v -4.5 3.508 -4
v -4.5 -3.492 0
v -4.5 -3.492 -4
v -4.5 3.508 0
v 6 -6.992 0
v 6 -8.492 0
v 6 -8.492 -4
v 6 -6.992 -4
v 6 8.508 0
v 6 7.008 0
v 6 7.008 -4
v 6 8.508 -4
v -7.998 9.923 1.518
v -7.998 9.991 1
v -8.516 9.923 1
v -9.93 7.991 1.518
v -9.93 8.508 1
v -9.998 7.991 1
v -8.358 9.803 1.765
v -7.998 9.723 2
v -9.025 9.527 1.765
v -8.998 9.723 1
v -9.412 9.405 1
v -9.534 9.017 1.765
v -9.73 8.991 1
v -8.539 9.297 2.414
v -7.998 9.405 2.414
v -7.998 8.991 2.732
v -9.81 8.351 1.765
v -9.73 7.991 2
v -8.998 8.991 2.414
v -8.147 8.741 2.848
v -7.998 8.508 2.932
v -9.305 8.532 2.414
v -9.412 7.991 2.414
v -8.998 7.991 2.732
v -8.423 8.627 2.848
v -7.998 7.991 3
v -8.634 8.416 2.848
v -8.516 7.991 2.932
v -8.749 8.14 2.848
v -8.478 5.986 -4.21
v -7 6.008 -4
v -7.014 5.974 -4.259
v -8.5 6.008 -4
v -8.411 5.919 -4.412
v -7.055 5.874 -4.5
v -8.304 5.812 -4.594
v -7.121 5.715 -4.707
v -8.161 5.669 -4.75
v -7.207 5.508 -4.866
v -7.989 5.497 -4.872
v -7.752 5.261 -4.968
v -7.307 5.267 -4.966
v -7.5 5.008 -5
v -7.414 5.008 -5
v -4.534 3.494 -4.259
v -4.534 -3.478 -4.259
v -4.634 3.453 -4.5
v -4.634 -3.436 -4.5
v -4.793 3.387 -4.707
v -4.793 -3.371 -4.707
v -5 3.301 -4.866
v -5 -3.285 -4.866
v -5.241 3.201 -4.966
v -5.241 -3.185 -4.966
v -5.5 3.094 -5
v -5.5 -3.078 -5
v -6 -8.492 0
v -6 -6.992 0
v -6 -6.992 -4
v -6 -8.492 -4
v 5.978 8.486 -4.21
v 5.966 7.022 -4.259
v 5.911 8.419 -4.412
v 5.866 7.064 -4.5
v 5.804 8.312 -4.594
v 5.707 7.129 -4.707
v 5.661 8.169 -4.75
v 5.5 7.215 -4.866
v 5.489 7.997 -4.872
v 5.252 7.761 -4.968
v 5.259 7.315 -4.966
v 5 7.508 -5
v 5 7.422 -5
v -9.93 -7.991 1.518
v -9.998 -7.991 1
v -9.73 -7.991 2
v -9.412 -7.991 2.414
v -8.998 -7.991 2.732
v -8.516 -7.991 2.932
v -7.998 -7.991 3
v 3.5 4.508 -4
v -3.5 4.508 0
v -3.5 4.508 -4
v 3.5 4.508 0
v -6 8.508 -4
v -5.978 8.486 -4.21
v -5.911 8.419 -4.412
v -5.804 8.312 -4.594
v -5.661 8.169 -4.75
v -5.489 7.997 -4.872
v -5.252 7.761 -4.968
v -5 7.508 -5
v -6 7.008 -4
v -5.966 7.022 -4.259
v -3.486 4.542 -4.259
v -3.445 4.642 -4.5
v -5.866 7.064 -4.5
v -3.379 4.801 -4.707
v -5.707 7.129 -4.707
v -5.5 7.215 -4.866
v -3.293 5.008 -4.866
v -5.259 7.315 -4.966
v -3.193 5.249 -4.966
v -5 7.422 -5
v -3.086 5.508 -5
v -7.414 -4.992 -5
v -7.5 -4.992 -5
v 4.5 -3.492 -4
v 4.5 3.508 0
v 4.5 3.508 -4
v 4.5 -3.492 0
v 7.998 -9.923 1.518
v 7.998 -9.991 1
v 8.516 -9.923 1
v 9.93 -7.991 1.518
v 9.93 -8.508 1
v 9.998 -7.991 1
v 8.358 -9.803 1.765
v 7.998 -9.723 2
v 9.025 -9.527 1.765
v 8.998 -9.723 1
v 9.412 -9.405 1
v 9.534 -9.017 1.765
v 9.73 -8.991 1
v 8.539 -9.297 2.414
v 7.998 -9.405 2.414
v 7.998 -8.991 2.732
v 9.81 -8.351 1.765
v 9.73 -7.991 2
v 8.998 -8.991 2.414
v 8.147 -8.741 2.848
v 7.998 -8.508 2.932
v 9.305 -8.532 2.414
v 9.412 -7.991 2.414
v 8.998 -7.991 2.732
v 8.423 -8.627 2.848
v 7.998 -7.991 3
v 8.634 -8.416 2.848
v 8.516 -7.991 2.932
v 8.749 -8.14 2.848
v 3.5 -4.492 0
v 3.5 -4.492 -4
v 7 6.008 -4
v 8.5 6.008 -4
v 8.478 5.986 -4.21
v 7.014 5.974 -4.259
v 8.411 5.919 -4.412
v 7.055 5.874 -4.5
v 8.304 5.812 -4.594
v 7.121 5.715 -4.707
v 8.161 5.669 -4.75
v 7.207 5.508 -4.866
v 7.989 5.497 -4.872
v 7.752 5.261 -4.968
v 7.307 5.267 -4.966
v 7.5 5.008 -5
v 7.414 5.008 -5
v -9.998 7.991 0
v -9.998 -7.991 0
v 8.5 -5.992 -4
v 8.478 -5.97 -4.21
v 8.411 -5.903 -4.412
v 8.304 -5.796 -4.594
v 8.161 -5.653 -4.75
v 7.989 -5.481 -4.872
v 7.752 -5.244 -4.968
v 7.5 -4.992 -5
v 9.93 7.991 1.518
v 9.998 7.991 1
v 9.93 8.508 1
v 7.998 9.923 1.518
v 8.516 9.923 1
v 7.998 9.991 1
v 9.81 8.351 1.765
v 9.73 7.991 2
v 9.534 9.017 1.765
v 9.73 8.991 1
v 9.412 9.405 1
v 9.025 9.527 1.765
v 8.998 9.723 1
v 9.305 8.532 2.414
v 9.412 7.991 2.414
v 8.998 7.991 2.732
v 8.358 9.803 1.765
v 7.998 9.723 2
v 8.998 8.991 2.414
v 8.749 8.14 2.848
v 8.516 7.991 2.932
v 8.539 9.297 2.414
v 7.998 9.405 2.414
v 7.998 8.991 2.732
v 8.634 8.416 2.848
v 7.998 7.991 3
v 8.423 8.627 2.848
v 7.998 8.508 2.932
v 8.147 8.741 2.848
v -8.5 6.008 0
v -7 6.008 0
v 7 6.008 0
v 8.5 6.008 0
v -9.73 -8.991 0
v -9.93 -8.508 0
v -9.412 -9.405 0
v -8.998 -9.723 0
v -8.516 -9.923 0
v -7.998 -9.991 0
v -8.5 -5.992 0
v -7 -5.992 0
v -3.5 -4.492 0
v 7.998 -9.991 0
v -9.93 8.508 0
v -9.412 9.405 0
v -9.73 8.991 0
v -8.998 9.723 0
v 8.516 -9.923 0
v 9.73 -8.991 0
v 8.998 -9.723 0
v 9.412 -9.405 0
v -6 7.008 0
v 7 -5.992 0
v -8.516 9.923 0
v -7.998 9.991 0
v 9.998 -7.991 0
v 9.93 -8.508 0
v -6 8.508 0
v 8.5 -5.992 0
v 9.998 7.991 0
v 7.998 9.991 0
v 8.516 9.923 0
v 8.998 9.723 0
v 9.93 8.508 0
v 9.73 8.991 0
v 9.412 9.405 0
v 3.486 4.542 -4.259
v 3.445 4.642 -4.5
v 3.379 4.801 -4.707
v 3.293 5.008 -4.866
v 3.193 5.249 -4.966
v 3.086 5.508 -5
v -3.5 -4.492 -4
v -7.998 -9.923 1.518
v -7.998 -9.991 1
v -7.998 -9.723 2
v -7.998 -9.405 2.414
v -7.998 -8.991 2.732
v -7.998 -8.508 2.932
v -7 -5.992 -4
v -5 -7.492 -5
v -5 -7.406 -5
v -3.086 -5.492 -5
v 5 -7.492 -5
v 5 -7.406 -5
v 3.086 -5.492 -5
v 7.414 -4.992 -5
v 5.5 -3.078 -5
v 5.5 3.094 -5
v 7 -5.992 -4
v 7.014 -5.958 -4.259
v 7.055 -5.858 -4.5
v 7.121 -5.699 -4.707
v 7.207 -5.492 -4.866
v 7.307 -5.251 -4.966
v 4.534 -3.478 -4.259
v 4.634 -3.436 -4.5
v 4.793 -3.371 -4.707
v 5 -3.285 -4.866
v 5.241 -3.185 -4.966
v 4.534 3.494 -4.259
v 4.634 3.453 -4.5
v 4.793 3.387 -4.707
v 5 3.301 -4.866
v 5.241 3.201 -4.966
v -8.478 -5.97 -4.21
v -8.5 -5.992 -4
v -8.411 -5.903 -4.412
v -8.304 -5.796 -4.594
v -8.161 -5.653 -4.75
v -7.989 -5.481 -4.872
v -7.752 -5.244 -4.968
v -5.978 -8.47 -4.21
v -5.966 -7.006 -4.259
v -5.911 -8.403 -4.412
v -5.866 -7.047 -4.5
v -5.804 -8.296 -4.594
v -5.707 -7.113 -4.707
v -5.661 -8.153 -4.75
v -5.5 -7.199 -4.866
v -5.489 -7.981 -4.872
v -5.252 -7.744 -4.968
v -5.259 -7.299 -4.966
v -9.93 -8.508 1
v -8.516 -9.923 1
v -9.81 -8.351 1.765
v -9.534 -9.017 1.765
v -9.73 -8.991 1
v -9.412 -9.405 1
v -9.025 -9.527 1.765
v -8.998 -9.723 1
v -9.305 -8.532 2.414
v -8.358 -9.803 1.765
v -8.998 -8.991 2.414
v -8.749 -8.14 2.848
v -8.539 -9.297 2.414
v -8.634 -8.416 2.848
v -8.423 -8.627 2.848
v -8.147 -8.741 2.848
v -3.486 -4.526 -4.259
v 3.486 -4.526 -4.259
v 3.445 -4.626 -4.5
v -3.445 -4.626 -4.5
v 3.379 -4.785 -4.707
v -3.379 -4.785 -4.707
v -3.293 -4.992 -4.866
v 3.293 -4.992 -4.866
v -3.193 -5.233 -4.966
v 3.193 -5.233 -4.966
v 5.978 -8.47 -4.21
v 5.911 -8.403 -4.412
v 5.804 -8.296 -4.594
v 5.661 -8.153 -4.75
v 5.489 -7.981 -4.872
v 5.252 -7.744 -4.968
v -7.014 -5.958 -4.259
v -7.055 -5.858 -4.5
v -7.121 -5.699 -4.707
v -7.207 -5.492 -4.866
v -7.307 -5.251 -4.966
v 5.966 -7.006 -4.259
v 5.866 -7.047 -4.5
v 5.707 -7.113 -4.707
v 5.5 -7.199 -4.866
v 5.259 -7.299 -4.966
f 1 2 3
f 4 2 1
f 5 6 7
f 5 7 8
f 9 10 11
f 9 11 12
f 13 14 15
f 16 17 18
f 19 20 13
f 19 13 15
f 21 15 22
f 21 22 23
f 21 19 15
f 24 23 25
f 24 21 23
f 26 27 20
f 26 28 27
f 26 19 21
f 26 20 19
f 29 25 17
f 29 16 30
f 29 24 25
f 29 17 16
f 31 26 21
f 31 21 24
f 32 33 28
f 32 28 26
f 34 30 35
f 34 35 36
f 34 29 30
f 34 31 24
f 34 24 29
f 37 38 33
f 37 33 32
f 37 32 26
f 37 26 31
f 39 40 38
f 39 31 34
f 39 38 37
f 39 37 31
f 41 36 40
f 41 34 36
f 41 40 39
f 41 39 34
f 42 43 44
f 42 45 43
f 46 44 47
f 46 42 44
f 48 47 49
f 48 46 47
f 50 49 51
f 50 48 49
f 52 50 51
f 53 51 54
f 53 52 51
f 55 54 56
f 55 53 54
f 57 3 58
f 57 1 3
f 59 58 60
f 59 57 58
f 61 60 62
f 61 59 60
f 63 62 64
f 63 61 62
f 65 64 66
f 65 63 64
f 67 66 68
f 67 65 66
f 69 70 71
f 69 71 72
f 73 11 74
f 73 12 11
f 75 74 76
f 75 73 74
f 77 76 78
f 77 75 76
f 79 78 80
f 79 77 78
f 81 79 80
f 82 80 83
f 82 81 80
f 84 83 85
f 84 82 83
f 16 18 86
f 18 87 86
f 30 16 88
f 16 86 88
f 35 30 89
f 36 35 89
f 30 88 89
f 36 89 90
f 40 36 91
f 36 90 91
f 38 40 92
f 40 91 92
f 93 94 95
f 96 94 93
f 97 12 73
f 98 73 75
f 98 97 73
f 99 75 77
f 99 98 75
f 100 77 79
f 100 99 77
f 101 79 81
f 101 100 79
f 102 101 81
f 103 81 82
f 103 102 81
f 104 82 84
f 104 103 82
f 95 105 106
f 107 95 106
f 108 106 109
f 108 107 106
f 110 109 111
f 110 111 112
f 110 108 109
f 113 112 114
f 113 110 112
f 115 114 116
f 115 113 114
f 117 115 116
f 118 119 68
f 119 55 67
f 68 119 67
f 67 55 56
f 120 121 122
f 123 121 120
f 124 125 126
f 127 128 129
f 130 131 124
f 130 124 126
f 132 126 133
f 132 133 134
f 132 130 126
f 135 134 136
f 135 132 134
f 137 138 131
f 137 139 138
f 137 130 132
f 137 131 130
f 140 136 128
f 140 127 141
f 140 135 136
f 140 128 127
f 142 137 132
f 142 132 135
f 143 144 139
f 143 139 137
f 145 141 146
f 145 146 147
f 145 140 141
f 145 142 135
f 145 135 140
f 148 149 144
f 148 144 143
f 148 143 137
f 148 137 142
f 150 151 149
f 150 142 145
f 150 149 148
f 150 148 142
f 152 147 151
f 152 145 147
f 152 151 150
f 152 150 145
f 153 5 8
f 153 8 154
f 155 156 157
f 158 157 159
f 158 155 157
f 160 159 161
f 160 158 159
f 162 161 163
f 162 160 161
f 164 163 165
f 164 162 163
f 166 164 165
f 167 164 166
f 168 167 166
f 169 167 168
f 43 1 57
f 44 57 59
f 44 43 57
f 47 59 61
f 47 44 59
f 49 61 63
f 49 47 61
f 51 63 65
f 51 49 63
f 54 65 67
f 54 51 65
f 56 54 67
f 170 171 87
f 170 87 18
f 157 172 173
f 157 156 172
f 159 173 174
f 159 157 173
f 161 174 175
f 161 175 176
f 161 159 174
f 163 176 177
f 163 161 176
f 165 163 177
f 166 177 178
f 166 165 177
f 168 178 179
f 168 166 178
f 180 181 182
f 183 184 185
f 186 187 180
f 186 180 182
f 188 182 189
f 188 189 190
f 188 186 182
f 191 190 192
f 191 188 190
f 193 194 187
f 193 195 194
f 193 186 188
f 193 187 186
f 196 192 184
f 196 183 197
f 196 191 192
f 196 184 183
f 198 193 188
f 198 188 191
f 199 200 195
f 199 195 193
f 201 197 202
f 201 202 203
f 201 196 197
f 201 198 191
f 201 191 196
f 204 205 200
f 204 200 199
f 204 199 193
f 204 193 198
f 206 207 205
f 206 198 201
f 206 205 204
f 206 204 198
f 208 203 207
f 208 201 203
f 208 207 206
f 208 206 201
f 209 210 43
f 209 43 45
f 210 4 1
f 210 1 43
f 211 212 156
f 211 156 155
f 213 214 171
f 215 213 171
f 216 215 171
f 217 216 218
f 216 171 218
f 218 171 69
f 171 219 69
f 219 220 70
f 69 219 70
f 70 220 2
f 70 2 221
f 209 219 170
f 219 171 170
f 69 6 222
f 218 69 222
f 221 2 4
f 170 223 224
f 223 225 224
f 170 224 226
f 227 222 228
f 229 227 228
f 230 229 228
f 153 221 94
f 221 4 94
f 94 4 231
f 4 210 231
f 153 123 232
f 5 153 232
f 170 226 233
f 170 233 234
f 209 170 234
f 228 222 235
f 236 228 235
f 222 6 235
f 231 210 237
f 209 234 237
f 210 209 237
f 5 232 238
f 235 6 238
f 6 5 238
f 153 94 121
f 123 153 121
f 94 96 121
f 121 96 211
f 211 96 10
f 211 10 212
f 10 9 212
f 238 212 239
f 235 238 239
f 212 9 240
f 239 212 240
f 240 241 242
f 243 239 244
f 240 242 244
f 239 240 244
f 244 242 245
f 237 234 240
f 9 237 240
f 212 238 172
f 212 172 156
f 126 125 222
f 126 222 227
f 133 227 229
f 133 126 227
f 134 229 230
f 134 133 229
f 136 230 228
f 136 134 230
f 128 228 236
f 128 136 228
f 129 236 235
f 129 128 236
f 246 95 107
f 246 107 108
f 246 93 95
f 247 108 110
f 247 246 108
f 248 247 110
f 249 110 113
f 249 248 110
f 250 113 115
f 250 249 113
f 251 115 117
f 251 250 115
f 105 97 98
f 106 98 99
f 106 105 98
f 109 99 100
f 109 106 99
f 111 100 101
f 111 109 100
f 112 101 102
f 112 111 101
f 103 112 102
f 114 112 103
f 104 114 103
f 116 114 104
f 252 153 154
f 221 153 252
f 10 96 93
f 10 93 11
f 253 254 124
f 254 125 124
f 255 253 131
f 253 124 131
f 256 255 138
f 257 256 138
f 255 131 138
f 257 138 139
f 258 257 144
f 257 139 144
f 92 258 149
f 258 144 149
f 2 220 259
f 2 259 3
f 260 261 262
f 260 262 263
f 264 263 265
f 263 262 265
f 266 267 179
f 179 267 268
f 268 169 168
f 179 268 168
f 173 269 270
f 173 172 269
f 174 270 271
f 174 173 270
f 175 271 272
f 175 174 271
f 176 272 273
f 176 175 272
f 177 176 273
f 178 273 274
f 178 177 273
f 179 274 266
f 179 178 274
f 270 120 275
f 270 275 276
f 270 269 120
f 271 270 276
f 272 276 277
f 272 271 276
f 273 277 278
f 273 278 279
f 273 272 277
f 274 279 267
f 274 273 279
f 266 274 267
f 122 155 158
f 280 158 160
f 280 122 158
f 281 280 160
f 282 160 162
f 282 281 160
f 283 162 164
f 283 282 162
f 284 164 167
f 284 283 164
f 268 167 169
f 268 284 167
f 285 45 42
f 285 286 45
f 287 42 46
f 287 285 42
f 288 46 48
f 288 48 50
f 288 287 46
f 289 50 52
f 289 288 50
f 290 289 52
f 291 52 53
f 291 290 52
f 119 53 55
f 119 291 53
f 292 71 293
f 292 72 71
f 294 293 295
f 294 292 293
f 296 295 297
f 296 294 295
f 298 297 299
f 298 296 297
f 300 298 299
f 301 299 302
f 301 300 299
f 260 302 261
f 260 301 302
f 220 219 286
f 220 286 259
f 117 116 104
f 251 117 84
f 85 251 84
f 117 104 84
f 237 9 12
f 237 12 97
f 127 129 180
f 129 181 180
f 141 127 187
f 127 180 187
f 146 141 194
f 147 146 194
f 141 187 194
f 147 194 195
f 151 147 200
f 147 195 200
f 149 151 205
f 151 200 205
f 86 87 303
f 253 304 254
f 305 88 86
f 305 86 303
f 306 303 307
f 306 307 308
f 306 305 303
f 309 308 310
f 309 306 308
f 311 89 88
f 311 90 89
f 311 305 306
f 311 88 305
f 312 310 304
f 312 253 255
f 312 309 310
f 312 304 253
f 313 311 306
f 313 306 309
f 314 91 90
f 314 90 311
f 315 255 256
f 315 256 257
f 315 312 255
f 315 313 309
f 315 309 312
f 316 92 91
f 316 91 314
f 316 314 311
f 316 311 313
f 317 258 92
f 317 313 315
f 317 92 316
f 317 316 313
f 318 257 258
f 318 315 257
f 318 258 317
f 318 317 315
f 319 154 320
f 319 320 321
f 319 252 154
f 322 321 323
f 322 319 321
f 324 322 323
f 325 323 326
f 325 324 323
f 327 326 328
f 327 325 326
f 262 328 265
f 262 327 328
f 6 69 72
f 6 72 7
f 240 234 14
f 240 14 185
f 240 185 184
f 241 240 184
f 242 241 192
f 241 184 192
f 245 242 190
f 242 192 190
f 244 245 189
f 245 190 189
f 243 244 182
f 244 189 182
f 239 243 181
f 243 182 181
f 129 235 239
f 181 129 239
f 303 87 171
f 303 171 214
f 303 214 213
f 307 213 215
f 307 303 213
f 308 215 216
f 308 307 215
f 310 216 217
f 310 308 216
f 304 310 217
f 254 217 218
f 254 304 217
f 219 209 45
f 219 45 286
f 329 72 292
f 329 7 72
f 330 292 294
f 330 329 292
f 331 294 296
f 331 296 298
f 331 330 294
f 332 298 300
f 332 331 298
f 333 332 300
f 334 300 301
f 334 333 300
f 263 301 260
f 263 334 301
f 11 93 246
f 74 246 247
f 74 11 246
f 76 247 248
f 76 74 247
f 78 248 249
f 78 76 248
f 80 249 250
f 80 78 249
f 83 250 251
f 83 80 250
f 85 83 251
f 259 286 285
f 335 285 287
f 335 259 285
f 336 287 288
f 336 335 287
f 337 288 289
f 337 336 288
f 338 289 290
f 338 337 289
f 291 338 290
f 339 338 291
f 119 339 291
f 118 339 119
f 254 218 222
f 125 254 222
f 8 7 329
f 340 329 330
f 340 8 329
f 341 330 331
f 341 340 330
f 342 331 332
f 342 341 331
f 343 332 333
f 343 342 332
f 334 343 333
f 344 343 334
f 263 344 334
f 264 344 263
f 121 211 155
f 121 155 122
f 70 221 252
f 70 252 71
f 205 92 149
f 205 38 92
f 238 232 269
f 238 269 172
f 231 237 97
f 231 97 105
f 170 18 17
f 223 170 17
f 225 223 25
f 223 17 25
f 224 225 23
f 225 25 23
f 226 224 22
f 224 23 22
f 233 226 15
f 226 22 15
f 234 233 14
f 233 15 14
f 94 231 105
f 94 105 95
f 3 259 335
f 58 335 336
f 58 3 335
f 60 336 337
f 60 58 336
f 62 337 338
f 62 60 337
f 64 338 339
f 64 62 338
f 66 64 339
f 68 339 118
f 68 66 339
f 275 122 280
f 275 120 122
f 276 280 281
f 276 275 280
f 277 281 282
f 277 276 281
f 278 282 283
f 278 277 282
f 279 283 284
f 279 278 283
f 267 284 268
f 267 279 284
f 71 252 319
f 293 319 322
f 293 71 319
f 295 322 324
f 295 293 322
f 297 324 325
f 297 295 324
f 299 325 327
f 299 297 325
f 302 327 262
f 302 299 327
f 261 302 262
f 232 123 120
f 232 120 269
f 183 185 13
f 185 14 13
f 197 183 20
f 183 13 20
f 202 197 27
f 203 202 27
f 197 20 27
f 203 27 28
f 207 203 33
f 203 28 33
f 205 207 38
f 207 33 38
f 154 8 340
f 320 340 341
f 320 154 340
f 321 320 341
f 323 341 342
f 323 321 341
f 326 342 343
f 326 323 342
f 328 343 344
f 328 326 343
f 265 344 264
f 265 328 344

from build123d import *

# Parameters (mm, degrees)
F2_W     = 19.995908
F2_H     = 19.98147
F3_DEPTH = 3
F4_DEPTH = 5
F5_R     = 1
F6_R     = 2
F7_R     = 2


with BuildPart() as f3:
    # F2 (on Top) → F3 (new body)
    with BuildSketch(Plane.XY):
        Rectangle(F2_W, F2_H)
    extrude(amount=F3_DEPTH)

    # F1 (on Top) → F4 (join)
    with BuildSketch(Plane.XY):
        Polygon((-8.5, 6.008047), (-8.5, -5.991953), (-7, -5.991953), (-4.5, -3.491953), (-4.5, 3.508047), (-7, 6.008047), align=None)
        Polygon((6, 8.508047), (-6, 8.508047), (-6, 7.008047), (-3.5, 4.508047), (3.5, 4.508047), (6, 7.008047), align=None)
        Polygon((7, -5.991953), (8.5, -5.991953), (8.5, 6.008047), (7, 6.008047), (4.5, 3.508047), (4.5, -3.491953), align=None)
        Polygon((-6, -6.991953), (-6, -8.491953), (6, -8.491953), (6, -6.991953), (3.5, -4.491953), (-3.5, -4.491953), align=None)
    extrude(amount=-F4_DEPTH)

    # F5
    f5_edges = [f3.edges().sort_by_distance(p)[0] for p in [
        (0, 8.508047, -5),
        (-6, 7.758047, -5),
        (-4.75, 5.758047, -5),
        (0, 4.508047, -5),
        (4.75, 5.758047, -5),
        (6, 7.758047, -5),
        (-5.75, 4.758047, -5),
        (-7.75, 6.008047, -5),
        (-8.5, 0.008047, -5),
        (-7.75, -5.991953, -5),
        (-5.75, -4.741953, -5),
        (-4.5, 0.008047, -5),
        (-6, -7.741953, -5),
        (0, -8.491953, -5),
        (6, -7.741953, -5),
        (4.75, -5.741953, -5),
        (0, -4.491953, -5),
        (-4.75, -5.741953, -5),
        (5.75, -4.741953, -5),
        (7.75, -5.991953, -5),
        (8.5, 0.008047, -5),
        (7.75, 6.008047, -5),
        (5.75, 4.758047, -5),
        (4.5, 0.008047, -5),
    ]]
    fillet(f5_edges, radius=F5_R)

    # F6
    f6_edges = [f3.edges().sort_by_distance(p)[0] for p in [
        (9.997954, 9.990735, 1.5),
        (9.997954, -9.990735, 1.5),
        (-9.997954, -9.990735, 1.5),
        (-9.997954, 9.990735, 1.5),
    ]]
    fillet(f6_edges, radius=F6_R)

    # F7
    f7_edges = [f3.edges().sort_by_distance(p)[0] for p in [
        (0, -9.990735, 3),
        (-9.412167, -9.404949, 3),
        (9.412167, -9.404949, 3),
        (-9.997954, 0, 3),
        (9.997954, 0, 3),
        (-9.412167, 9.404949, 3),
        (9.412167, 9.404949, 3),
        (0, 9.990735, 3),
    ]]
    fillet(f7_edges, radius=F7_R)


solid = f3.part
